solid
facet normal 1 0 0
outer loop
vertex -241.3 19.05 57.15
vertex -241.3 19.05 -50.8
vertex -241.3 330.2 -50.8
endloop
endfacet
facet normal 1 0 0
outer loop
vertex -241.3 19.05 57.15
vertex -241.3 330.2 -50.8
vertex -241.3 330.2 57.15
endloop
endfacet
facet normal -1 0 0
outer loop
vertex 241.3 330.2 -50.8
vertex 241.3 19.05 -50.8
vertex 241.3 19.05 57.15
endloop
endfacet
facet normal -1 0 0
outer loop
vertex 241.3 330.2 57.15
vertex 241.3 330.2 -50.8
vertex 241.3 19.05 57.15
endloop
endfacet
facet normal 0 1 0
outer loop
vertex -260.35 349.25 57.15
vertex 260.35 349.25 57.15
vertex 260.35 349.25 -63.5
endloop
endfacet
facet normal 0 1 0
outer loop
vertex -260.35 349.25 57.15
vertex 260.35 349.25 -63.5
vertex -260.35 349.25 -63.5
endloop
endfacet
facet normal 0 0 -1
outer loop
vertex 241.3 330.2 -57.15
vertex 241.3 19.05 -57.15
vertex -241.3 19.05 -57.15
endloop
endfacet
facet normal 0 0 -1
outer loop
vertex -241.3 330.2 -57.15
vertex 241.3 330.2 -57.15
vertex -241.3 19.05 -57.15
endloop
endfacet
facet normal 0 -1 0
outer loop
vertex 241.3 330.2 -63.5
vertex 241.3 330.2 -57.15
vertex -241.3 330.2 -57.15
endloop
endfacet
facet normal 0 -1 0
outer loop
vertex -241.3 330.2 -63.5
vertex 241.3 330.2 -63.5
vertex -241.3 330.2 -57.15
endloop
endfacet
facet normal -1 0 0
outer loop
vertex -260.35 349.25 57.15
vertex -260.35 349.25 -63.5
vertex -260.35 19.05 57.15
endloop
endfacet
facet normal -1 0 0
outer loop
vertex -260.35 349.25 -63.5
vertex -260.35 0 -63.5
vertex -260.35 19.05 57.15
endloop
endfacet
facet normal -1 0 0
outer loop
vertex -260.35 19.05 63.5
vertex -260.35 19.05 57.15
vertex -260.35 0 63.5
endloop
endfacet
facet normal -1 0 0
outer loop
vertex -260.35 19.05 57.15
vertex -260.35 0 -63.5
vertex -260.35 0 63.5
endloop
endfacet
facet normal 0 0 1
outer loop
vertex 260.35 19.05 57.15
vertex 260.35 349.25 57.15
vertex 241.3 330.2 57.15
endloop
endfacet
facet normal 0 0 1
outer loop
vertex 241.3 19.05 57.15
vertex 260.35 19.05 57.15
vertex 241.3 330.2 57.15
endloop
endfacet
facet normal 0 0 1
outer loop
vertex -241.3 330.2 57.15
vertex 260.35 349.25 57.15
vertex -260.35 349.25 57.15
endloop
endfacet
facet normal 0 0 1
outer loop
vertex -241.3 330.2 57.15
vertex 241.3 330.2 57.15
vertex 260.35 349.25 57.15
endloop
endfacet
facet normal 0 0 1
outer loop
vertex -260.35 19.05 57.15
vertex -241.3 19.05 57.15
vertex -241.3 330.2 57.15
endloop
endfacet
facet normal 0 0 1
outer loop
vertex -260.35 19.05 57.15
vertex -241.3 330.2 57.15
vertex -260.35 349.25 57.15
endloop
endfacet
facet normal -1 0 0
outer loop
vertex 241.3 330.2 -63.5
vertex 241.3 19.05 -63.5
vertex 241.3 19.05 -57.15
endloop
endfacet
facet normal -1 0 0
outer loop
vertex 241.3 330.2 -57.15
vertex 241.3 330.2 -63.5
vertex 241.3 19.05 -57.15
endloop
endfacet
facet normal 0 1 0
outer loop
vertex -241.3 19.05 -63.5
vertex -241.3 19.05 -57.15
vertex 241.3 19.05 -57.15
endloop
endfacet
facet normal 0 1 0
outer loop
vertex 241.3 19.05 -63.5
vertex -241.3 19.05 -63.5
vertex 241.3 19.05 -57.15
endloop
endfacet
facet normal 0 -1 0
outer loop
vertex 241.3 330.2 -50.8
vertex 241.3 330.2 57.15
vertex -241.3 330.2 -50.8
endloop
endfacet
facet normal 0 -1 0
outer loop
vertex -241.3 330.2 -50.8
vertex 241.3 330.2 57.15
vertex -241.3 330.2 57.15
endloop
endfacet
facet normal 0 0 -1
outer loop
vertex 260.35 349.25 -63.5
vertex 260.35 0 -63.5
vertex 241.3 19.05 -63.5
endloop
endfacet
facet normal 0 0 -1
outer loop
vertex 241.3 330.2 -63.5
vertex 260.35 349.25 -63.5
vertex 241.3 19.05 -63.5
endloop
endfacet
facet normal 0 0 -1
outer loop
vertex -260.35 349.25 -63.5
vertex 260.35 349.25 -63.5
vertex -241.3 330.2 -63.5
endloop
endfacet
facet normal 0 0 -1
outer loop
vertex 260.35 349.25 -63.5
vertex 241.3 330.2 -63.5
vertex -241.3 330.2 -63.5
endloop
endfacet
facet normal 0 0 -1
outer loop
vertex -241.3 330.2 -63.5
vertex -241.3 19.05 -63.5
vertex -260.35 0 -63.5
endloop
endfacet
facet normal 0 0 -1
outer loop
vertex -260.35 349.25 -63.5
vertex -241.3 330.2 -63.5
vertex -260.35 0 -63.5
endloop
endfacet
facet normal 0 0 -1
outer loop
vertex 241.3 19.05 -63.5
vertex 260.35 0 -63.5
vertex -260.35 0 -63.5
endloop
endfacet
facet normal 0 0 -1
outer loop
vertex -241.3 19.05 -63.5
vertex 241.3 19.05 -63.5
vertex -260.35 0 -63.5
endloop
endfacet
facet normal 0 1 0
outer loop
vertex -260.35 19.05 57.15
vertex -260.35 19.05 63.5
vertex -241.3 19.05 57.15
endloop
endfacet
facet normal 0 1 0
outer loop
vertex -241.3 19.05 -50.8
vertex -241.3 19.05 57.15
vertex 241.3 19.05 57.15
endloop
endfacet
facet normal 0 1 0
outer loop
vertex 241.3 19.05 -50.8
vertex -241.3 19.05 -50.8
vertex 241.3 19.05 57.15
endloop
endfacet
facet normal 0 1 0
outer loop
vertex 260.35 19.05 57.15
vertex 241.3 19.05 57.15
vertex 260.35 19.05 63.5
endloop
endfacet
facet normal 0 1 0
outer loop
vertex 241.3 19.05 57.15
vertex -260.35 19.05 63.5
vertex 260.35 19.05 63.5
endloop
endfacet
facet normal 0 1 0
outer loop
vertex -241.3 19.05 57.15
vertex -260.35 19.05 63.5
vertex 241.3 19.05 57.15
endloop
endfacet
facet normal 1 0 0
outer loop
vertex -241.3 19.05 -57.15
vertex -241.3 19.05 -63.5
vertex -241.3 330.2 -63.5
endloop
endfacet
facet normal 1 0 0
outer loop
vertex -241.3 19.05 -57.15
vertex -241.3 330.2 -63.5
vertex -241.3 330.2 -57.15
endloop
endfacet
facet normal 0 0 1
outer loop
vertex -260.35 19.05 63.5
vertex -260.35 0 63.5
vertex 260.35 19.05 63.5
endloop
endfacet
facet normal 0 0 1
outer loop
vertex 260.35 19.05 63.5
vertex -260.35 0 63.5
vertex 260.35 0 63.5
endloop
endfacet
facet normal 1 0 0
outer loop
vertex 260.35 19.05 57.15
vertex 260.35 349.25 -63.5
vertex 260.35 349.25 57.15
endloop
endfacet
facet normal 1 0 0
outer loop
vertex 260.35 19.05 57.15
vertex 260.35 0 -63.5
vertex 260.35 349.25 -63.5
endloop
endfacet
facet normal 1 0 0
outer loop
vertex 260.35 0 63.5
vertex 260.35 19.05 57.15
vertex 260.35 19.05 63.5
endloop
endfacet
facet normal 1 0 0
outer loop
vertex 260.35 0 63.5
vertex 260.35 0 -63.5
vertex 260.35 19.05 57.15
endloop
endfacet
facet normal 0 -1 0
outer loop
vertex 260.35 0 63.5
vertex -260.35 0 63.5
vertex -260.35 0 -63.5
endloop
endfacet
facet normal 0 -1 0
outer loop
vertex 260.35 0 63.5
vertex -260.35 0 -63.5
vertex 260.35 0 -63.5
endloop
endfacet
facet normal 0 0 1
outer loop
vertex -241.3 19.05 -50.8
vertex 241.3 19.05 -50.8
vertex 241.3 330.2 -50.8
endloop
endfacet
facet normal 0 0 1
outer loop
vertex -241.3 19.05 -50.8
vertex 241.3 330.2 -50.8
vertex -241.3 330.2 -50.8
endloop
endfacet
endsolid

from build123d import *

# Parameters (mm, degrees)
F0_W      = 520.7
F0_H      = 127
F1_DEPTH  = 19.05
F3_DEPTH  = 311.15
F5_W      = 520.7
F5_H      = 120.65
F6_DEPTH  = 19.05
F7_W      = 501.65
F7_H      = 6.35
F8_DEPTH  = 6.35
F9_W      = 501.65
F9_H      = 6.35
F10_DEPTH = 317.5


with BuildPart() as f1:
    # F0 (on Front) → F1 (new body)
    with BuildSketch(Plane.XZ):
        Rectangle(F0_W, F0_H)
    extrude(amount=-F1_DEPTH)

    # F2 (on face) → F3 (join)
    with BuildSketch(Plane(origin=(0, 19.05, 0), x_dir=(-1, 0, 0), z_dir=(0, 1, 0))):
        Polygon((-260.35, 57.15), (-260.35, -63.5), (-241.3, -63.5), (-241.3, -57.15), (-250.825, -57.15), (-250.825, -50.8), (-241.3, -50.8), (-241.3, 57.15), align=None)
    extrude(amount=F3_DEPTH)

    # F4: F1 across plane


with BuildPart() as f1_1:
    add(f1.part)
    add(f1.part.mirror(Plane.YZ))

    # F5 (on face) → F6 (join)
    with BuildSketch(Plane(origin=(0, 330.2, 0), x_dir=(-1, 0, 0), z_dir=(0, 1, 0))):
        with Locations((0, -3.175)):
            Rectangle(F5_W, F5_H)
    extrude(amount=F6_DEPTH)

    # F7 (on face) → F8 (cut)
    with BuildSketch(Plane.XZ.offset(-330.2)):
        with Locations((0, -53.975)):
            Rectangle(F7_W, F7_H)
    extrude(amount=-F8_DEPTH, mode=Mode.SUBTRACT)

    # F9 (on face) → F10 (join, through all)
    with BuildSketch(Plane(origin=(0, 19.05, 0), x_dir=(-1, 0, 0), z_dir=(0, 1, 0))):
        with Locations((0, -53.975)):
            Rectangle(F9_W, F9_H)
    extrude(amount=F10_DEPTH)


solid = f1_1.part
